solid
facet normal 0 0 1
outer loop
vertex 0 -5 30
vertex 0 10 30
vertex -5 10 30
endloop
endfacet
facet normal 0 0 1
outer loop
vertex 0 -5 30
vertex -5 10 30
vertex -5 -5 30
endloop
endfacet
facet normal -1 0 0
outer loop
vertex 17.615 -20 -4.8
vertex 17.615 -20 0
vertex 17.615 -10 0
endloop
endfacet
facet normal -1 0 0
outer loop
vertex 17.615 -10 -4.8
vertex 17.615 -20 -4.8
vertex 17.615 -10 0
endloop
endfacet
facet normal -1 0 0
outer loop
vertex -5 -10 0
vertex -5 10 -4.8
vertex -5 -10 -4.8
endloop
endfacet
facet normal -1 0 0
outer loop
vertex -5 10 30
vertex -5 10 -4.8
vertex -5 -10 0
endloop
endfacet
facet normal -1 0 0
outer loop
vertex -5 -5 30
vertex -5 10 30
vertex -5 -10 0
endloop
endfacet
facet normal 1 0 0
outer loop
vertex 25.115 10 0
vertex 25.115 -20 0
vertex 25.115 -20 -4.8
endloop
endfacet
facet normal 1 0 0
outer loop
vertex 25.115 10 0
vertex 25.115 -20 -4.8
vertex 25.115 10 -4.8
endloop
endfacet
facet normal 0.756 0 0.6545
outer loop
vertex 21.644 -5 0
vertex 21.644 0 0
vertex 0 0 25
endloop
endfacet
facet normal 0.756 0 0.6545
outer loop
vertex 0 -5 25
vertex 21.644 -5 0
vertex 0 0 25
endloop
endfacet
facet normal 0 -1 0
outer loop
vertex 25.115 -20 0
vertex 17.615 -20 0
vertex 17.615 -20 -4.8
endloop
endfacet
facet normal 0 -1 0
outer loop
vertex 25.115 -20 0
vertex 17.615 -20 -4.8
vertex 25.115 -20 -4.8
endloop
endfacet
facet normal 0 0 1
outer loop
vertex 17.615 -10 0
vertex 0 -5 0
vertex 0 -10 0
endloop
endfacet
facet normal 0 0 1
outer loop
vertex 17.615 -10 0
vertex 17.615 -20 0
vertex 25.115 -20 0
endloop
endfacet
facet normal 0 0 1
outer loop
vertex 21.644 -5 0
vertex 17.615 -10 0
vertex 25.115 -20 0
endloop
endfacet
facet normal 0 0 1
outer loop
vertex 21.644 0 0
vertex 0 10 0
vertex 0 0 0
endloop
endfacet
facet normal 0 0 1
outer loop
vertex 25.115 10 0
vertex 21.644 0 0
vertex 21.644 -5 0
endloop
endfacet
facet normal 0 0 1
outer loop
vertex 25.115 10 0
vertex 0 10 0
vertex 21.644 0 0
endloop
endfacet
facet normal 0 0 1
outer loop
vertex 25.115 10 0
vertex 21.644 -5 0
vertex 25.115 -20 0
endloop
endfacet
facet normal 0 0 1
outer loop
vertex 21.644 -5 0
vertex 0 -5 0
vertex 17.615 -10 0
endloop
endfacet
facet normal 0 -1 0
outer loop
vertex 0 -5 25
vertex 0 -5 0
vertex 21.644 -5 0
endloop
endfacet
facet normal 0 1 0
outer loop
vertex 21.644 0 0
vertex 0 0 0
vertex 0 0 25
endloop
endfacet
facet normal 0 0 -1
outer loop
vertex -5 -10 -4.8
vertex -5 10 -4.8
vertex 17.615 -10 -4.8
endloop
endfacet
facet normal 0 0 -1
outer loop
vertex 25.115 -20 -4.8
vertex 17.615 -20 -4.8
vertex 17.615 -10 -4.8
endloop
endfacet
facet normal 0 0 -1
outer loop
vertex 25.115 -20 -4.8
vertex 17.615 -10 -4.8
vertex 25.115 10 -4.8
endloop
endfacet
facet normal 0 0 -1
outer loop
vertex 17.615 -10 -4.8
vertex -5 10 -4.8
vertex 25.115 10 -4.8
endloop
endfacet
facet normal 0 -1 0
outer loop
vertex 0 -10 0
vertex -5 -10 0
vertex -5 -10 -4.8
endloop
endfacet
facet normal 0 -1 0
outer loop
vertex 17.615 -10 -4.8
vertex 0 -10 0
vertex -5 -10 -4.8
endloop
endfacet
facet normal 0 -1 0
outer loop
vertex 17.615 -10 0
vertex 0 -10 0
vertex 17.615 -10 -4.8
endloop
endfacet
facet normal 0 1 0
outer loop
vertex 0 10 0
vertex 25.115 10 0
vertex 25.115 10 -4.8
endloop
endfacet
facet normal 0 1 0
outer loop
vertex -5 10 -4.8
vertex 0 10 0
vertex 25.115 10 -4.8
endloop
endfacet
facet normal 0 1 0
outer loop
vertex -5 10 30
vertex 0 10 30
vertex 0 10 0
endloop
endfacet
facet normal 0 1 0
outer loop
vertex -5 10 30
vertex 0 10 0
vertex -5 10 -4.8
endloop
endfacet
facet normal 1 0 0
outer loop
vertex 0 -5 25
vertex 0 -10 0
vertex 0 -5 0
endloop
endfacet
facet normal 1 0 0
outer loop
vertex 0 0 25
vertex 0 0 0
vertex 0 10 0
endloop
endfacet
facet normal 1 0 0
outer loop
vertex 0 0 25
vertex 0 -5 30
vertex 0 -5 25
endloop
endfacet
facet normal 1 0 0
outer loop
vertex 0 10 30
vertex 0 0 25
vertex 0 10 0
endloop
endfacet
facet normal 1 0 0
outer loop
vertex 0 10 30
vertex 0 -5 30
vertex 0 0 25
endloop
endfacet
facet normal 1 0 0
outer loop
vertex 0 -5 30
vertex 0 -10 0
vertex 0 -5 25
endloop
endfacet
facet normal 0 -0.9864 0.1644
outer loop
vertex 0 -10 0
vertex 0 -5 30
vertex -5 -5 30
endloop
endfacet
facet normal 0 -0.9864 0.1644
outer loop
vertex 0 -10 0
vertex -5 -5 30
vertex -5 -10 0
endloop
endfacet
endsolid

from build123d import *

# Parameters (mm, degrees)
F1_DEPTH = 5
F3_DEPTH = 5
F4_W     = 7.5
F4_H     = 10
F5_DEPTH = 4.8


with BuildPart() as f1:
    # F0 (on Front) → F1 (new body)
    with BuildSketch(Plane.XZ):
        Polygon((21.644296, 0), (0, 25), (0, 0), align=None)
    extrude(amount=F1_DEPTH)

    # F2 (on Right) → F3 (join)
    with BuildSketch(Plane.YZ):
        Polygon((-10, 0), (10, 0), (10, 30), (-5, 30), align=None)
    extrude(amount=-F3_DEPTH)

    # F4 (on Top) → F5 (join)
    with BuildSketch(Plane.XY):
        Polygon((-5, 10), (-5, -10), (17.615132, -10), (25.115132, -10), (25.115132, 10), align=None)
        with Locations((21.365132, -15)):
            Rectangle(F4_W, F4_H)
    extrude(amount=-F5_DEPTH)


solid = f1.part
